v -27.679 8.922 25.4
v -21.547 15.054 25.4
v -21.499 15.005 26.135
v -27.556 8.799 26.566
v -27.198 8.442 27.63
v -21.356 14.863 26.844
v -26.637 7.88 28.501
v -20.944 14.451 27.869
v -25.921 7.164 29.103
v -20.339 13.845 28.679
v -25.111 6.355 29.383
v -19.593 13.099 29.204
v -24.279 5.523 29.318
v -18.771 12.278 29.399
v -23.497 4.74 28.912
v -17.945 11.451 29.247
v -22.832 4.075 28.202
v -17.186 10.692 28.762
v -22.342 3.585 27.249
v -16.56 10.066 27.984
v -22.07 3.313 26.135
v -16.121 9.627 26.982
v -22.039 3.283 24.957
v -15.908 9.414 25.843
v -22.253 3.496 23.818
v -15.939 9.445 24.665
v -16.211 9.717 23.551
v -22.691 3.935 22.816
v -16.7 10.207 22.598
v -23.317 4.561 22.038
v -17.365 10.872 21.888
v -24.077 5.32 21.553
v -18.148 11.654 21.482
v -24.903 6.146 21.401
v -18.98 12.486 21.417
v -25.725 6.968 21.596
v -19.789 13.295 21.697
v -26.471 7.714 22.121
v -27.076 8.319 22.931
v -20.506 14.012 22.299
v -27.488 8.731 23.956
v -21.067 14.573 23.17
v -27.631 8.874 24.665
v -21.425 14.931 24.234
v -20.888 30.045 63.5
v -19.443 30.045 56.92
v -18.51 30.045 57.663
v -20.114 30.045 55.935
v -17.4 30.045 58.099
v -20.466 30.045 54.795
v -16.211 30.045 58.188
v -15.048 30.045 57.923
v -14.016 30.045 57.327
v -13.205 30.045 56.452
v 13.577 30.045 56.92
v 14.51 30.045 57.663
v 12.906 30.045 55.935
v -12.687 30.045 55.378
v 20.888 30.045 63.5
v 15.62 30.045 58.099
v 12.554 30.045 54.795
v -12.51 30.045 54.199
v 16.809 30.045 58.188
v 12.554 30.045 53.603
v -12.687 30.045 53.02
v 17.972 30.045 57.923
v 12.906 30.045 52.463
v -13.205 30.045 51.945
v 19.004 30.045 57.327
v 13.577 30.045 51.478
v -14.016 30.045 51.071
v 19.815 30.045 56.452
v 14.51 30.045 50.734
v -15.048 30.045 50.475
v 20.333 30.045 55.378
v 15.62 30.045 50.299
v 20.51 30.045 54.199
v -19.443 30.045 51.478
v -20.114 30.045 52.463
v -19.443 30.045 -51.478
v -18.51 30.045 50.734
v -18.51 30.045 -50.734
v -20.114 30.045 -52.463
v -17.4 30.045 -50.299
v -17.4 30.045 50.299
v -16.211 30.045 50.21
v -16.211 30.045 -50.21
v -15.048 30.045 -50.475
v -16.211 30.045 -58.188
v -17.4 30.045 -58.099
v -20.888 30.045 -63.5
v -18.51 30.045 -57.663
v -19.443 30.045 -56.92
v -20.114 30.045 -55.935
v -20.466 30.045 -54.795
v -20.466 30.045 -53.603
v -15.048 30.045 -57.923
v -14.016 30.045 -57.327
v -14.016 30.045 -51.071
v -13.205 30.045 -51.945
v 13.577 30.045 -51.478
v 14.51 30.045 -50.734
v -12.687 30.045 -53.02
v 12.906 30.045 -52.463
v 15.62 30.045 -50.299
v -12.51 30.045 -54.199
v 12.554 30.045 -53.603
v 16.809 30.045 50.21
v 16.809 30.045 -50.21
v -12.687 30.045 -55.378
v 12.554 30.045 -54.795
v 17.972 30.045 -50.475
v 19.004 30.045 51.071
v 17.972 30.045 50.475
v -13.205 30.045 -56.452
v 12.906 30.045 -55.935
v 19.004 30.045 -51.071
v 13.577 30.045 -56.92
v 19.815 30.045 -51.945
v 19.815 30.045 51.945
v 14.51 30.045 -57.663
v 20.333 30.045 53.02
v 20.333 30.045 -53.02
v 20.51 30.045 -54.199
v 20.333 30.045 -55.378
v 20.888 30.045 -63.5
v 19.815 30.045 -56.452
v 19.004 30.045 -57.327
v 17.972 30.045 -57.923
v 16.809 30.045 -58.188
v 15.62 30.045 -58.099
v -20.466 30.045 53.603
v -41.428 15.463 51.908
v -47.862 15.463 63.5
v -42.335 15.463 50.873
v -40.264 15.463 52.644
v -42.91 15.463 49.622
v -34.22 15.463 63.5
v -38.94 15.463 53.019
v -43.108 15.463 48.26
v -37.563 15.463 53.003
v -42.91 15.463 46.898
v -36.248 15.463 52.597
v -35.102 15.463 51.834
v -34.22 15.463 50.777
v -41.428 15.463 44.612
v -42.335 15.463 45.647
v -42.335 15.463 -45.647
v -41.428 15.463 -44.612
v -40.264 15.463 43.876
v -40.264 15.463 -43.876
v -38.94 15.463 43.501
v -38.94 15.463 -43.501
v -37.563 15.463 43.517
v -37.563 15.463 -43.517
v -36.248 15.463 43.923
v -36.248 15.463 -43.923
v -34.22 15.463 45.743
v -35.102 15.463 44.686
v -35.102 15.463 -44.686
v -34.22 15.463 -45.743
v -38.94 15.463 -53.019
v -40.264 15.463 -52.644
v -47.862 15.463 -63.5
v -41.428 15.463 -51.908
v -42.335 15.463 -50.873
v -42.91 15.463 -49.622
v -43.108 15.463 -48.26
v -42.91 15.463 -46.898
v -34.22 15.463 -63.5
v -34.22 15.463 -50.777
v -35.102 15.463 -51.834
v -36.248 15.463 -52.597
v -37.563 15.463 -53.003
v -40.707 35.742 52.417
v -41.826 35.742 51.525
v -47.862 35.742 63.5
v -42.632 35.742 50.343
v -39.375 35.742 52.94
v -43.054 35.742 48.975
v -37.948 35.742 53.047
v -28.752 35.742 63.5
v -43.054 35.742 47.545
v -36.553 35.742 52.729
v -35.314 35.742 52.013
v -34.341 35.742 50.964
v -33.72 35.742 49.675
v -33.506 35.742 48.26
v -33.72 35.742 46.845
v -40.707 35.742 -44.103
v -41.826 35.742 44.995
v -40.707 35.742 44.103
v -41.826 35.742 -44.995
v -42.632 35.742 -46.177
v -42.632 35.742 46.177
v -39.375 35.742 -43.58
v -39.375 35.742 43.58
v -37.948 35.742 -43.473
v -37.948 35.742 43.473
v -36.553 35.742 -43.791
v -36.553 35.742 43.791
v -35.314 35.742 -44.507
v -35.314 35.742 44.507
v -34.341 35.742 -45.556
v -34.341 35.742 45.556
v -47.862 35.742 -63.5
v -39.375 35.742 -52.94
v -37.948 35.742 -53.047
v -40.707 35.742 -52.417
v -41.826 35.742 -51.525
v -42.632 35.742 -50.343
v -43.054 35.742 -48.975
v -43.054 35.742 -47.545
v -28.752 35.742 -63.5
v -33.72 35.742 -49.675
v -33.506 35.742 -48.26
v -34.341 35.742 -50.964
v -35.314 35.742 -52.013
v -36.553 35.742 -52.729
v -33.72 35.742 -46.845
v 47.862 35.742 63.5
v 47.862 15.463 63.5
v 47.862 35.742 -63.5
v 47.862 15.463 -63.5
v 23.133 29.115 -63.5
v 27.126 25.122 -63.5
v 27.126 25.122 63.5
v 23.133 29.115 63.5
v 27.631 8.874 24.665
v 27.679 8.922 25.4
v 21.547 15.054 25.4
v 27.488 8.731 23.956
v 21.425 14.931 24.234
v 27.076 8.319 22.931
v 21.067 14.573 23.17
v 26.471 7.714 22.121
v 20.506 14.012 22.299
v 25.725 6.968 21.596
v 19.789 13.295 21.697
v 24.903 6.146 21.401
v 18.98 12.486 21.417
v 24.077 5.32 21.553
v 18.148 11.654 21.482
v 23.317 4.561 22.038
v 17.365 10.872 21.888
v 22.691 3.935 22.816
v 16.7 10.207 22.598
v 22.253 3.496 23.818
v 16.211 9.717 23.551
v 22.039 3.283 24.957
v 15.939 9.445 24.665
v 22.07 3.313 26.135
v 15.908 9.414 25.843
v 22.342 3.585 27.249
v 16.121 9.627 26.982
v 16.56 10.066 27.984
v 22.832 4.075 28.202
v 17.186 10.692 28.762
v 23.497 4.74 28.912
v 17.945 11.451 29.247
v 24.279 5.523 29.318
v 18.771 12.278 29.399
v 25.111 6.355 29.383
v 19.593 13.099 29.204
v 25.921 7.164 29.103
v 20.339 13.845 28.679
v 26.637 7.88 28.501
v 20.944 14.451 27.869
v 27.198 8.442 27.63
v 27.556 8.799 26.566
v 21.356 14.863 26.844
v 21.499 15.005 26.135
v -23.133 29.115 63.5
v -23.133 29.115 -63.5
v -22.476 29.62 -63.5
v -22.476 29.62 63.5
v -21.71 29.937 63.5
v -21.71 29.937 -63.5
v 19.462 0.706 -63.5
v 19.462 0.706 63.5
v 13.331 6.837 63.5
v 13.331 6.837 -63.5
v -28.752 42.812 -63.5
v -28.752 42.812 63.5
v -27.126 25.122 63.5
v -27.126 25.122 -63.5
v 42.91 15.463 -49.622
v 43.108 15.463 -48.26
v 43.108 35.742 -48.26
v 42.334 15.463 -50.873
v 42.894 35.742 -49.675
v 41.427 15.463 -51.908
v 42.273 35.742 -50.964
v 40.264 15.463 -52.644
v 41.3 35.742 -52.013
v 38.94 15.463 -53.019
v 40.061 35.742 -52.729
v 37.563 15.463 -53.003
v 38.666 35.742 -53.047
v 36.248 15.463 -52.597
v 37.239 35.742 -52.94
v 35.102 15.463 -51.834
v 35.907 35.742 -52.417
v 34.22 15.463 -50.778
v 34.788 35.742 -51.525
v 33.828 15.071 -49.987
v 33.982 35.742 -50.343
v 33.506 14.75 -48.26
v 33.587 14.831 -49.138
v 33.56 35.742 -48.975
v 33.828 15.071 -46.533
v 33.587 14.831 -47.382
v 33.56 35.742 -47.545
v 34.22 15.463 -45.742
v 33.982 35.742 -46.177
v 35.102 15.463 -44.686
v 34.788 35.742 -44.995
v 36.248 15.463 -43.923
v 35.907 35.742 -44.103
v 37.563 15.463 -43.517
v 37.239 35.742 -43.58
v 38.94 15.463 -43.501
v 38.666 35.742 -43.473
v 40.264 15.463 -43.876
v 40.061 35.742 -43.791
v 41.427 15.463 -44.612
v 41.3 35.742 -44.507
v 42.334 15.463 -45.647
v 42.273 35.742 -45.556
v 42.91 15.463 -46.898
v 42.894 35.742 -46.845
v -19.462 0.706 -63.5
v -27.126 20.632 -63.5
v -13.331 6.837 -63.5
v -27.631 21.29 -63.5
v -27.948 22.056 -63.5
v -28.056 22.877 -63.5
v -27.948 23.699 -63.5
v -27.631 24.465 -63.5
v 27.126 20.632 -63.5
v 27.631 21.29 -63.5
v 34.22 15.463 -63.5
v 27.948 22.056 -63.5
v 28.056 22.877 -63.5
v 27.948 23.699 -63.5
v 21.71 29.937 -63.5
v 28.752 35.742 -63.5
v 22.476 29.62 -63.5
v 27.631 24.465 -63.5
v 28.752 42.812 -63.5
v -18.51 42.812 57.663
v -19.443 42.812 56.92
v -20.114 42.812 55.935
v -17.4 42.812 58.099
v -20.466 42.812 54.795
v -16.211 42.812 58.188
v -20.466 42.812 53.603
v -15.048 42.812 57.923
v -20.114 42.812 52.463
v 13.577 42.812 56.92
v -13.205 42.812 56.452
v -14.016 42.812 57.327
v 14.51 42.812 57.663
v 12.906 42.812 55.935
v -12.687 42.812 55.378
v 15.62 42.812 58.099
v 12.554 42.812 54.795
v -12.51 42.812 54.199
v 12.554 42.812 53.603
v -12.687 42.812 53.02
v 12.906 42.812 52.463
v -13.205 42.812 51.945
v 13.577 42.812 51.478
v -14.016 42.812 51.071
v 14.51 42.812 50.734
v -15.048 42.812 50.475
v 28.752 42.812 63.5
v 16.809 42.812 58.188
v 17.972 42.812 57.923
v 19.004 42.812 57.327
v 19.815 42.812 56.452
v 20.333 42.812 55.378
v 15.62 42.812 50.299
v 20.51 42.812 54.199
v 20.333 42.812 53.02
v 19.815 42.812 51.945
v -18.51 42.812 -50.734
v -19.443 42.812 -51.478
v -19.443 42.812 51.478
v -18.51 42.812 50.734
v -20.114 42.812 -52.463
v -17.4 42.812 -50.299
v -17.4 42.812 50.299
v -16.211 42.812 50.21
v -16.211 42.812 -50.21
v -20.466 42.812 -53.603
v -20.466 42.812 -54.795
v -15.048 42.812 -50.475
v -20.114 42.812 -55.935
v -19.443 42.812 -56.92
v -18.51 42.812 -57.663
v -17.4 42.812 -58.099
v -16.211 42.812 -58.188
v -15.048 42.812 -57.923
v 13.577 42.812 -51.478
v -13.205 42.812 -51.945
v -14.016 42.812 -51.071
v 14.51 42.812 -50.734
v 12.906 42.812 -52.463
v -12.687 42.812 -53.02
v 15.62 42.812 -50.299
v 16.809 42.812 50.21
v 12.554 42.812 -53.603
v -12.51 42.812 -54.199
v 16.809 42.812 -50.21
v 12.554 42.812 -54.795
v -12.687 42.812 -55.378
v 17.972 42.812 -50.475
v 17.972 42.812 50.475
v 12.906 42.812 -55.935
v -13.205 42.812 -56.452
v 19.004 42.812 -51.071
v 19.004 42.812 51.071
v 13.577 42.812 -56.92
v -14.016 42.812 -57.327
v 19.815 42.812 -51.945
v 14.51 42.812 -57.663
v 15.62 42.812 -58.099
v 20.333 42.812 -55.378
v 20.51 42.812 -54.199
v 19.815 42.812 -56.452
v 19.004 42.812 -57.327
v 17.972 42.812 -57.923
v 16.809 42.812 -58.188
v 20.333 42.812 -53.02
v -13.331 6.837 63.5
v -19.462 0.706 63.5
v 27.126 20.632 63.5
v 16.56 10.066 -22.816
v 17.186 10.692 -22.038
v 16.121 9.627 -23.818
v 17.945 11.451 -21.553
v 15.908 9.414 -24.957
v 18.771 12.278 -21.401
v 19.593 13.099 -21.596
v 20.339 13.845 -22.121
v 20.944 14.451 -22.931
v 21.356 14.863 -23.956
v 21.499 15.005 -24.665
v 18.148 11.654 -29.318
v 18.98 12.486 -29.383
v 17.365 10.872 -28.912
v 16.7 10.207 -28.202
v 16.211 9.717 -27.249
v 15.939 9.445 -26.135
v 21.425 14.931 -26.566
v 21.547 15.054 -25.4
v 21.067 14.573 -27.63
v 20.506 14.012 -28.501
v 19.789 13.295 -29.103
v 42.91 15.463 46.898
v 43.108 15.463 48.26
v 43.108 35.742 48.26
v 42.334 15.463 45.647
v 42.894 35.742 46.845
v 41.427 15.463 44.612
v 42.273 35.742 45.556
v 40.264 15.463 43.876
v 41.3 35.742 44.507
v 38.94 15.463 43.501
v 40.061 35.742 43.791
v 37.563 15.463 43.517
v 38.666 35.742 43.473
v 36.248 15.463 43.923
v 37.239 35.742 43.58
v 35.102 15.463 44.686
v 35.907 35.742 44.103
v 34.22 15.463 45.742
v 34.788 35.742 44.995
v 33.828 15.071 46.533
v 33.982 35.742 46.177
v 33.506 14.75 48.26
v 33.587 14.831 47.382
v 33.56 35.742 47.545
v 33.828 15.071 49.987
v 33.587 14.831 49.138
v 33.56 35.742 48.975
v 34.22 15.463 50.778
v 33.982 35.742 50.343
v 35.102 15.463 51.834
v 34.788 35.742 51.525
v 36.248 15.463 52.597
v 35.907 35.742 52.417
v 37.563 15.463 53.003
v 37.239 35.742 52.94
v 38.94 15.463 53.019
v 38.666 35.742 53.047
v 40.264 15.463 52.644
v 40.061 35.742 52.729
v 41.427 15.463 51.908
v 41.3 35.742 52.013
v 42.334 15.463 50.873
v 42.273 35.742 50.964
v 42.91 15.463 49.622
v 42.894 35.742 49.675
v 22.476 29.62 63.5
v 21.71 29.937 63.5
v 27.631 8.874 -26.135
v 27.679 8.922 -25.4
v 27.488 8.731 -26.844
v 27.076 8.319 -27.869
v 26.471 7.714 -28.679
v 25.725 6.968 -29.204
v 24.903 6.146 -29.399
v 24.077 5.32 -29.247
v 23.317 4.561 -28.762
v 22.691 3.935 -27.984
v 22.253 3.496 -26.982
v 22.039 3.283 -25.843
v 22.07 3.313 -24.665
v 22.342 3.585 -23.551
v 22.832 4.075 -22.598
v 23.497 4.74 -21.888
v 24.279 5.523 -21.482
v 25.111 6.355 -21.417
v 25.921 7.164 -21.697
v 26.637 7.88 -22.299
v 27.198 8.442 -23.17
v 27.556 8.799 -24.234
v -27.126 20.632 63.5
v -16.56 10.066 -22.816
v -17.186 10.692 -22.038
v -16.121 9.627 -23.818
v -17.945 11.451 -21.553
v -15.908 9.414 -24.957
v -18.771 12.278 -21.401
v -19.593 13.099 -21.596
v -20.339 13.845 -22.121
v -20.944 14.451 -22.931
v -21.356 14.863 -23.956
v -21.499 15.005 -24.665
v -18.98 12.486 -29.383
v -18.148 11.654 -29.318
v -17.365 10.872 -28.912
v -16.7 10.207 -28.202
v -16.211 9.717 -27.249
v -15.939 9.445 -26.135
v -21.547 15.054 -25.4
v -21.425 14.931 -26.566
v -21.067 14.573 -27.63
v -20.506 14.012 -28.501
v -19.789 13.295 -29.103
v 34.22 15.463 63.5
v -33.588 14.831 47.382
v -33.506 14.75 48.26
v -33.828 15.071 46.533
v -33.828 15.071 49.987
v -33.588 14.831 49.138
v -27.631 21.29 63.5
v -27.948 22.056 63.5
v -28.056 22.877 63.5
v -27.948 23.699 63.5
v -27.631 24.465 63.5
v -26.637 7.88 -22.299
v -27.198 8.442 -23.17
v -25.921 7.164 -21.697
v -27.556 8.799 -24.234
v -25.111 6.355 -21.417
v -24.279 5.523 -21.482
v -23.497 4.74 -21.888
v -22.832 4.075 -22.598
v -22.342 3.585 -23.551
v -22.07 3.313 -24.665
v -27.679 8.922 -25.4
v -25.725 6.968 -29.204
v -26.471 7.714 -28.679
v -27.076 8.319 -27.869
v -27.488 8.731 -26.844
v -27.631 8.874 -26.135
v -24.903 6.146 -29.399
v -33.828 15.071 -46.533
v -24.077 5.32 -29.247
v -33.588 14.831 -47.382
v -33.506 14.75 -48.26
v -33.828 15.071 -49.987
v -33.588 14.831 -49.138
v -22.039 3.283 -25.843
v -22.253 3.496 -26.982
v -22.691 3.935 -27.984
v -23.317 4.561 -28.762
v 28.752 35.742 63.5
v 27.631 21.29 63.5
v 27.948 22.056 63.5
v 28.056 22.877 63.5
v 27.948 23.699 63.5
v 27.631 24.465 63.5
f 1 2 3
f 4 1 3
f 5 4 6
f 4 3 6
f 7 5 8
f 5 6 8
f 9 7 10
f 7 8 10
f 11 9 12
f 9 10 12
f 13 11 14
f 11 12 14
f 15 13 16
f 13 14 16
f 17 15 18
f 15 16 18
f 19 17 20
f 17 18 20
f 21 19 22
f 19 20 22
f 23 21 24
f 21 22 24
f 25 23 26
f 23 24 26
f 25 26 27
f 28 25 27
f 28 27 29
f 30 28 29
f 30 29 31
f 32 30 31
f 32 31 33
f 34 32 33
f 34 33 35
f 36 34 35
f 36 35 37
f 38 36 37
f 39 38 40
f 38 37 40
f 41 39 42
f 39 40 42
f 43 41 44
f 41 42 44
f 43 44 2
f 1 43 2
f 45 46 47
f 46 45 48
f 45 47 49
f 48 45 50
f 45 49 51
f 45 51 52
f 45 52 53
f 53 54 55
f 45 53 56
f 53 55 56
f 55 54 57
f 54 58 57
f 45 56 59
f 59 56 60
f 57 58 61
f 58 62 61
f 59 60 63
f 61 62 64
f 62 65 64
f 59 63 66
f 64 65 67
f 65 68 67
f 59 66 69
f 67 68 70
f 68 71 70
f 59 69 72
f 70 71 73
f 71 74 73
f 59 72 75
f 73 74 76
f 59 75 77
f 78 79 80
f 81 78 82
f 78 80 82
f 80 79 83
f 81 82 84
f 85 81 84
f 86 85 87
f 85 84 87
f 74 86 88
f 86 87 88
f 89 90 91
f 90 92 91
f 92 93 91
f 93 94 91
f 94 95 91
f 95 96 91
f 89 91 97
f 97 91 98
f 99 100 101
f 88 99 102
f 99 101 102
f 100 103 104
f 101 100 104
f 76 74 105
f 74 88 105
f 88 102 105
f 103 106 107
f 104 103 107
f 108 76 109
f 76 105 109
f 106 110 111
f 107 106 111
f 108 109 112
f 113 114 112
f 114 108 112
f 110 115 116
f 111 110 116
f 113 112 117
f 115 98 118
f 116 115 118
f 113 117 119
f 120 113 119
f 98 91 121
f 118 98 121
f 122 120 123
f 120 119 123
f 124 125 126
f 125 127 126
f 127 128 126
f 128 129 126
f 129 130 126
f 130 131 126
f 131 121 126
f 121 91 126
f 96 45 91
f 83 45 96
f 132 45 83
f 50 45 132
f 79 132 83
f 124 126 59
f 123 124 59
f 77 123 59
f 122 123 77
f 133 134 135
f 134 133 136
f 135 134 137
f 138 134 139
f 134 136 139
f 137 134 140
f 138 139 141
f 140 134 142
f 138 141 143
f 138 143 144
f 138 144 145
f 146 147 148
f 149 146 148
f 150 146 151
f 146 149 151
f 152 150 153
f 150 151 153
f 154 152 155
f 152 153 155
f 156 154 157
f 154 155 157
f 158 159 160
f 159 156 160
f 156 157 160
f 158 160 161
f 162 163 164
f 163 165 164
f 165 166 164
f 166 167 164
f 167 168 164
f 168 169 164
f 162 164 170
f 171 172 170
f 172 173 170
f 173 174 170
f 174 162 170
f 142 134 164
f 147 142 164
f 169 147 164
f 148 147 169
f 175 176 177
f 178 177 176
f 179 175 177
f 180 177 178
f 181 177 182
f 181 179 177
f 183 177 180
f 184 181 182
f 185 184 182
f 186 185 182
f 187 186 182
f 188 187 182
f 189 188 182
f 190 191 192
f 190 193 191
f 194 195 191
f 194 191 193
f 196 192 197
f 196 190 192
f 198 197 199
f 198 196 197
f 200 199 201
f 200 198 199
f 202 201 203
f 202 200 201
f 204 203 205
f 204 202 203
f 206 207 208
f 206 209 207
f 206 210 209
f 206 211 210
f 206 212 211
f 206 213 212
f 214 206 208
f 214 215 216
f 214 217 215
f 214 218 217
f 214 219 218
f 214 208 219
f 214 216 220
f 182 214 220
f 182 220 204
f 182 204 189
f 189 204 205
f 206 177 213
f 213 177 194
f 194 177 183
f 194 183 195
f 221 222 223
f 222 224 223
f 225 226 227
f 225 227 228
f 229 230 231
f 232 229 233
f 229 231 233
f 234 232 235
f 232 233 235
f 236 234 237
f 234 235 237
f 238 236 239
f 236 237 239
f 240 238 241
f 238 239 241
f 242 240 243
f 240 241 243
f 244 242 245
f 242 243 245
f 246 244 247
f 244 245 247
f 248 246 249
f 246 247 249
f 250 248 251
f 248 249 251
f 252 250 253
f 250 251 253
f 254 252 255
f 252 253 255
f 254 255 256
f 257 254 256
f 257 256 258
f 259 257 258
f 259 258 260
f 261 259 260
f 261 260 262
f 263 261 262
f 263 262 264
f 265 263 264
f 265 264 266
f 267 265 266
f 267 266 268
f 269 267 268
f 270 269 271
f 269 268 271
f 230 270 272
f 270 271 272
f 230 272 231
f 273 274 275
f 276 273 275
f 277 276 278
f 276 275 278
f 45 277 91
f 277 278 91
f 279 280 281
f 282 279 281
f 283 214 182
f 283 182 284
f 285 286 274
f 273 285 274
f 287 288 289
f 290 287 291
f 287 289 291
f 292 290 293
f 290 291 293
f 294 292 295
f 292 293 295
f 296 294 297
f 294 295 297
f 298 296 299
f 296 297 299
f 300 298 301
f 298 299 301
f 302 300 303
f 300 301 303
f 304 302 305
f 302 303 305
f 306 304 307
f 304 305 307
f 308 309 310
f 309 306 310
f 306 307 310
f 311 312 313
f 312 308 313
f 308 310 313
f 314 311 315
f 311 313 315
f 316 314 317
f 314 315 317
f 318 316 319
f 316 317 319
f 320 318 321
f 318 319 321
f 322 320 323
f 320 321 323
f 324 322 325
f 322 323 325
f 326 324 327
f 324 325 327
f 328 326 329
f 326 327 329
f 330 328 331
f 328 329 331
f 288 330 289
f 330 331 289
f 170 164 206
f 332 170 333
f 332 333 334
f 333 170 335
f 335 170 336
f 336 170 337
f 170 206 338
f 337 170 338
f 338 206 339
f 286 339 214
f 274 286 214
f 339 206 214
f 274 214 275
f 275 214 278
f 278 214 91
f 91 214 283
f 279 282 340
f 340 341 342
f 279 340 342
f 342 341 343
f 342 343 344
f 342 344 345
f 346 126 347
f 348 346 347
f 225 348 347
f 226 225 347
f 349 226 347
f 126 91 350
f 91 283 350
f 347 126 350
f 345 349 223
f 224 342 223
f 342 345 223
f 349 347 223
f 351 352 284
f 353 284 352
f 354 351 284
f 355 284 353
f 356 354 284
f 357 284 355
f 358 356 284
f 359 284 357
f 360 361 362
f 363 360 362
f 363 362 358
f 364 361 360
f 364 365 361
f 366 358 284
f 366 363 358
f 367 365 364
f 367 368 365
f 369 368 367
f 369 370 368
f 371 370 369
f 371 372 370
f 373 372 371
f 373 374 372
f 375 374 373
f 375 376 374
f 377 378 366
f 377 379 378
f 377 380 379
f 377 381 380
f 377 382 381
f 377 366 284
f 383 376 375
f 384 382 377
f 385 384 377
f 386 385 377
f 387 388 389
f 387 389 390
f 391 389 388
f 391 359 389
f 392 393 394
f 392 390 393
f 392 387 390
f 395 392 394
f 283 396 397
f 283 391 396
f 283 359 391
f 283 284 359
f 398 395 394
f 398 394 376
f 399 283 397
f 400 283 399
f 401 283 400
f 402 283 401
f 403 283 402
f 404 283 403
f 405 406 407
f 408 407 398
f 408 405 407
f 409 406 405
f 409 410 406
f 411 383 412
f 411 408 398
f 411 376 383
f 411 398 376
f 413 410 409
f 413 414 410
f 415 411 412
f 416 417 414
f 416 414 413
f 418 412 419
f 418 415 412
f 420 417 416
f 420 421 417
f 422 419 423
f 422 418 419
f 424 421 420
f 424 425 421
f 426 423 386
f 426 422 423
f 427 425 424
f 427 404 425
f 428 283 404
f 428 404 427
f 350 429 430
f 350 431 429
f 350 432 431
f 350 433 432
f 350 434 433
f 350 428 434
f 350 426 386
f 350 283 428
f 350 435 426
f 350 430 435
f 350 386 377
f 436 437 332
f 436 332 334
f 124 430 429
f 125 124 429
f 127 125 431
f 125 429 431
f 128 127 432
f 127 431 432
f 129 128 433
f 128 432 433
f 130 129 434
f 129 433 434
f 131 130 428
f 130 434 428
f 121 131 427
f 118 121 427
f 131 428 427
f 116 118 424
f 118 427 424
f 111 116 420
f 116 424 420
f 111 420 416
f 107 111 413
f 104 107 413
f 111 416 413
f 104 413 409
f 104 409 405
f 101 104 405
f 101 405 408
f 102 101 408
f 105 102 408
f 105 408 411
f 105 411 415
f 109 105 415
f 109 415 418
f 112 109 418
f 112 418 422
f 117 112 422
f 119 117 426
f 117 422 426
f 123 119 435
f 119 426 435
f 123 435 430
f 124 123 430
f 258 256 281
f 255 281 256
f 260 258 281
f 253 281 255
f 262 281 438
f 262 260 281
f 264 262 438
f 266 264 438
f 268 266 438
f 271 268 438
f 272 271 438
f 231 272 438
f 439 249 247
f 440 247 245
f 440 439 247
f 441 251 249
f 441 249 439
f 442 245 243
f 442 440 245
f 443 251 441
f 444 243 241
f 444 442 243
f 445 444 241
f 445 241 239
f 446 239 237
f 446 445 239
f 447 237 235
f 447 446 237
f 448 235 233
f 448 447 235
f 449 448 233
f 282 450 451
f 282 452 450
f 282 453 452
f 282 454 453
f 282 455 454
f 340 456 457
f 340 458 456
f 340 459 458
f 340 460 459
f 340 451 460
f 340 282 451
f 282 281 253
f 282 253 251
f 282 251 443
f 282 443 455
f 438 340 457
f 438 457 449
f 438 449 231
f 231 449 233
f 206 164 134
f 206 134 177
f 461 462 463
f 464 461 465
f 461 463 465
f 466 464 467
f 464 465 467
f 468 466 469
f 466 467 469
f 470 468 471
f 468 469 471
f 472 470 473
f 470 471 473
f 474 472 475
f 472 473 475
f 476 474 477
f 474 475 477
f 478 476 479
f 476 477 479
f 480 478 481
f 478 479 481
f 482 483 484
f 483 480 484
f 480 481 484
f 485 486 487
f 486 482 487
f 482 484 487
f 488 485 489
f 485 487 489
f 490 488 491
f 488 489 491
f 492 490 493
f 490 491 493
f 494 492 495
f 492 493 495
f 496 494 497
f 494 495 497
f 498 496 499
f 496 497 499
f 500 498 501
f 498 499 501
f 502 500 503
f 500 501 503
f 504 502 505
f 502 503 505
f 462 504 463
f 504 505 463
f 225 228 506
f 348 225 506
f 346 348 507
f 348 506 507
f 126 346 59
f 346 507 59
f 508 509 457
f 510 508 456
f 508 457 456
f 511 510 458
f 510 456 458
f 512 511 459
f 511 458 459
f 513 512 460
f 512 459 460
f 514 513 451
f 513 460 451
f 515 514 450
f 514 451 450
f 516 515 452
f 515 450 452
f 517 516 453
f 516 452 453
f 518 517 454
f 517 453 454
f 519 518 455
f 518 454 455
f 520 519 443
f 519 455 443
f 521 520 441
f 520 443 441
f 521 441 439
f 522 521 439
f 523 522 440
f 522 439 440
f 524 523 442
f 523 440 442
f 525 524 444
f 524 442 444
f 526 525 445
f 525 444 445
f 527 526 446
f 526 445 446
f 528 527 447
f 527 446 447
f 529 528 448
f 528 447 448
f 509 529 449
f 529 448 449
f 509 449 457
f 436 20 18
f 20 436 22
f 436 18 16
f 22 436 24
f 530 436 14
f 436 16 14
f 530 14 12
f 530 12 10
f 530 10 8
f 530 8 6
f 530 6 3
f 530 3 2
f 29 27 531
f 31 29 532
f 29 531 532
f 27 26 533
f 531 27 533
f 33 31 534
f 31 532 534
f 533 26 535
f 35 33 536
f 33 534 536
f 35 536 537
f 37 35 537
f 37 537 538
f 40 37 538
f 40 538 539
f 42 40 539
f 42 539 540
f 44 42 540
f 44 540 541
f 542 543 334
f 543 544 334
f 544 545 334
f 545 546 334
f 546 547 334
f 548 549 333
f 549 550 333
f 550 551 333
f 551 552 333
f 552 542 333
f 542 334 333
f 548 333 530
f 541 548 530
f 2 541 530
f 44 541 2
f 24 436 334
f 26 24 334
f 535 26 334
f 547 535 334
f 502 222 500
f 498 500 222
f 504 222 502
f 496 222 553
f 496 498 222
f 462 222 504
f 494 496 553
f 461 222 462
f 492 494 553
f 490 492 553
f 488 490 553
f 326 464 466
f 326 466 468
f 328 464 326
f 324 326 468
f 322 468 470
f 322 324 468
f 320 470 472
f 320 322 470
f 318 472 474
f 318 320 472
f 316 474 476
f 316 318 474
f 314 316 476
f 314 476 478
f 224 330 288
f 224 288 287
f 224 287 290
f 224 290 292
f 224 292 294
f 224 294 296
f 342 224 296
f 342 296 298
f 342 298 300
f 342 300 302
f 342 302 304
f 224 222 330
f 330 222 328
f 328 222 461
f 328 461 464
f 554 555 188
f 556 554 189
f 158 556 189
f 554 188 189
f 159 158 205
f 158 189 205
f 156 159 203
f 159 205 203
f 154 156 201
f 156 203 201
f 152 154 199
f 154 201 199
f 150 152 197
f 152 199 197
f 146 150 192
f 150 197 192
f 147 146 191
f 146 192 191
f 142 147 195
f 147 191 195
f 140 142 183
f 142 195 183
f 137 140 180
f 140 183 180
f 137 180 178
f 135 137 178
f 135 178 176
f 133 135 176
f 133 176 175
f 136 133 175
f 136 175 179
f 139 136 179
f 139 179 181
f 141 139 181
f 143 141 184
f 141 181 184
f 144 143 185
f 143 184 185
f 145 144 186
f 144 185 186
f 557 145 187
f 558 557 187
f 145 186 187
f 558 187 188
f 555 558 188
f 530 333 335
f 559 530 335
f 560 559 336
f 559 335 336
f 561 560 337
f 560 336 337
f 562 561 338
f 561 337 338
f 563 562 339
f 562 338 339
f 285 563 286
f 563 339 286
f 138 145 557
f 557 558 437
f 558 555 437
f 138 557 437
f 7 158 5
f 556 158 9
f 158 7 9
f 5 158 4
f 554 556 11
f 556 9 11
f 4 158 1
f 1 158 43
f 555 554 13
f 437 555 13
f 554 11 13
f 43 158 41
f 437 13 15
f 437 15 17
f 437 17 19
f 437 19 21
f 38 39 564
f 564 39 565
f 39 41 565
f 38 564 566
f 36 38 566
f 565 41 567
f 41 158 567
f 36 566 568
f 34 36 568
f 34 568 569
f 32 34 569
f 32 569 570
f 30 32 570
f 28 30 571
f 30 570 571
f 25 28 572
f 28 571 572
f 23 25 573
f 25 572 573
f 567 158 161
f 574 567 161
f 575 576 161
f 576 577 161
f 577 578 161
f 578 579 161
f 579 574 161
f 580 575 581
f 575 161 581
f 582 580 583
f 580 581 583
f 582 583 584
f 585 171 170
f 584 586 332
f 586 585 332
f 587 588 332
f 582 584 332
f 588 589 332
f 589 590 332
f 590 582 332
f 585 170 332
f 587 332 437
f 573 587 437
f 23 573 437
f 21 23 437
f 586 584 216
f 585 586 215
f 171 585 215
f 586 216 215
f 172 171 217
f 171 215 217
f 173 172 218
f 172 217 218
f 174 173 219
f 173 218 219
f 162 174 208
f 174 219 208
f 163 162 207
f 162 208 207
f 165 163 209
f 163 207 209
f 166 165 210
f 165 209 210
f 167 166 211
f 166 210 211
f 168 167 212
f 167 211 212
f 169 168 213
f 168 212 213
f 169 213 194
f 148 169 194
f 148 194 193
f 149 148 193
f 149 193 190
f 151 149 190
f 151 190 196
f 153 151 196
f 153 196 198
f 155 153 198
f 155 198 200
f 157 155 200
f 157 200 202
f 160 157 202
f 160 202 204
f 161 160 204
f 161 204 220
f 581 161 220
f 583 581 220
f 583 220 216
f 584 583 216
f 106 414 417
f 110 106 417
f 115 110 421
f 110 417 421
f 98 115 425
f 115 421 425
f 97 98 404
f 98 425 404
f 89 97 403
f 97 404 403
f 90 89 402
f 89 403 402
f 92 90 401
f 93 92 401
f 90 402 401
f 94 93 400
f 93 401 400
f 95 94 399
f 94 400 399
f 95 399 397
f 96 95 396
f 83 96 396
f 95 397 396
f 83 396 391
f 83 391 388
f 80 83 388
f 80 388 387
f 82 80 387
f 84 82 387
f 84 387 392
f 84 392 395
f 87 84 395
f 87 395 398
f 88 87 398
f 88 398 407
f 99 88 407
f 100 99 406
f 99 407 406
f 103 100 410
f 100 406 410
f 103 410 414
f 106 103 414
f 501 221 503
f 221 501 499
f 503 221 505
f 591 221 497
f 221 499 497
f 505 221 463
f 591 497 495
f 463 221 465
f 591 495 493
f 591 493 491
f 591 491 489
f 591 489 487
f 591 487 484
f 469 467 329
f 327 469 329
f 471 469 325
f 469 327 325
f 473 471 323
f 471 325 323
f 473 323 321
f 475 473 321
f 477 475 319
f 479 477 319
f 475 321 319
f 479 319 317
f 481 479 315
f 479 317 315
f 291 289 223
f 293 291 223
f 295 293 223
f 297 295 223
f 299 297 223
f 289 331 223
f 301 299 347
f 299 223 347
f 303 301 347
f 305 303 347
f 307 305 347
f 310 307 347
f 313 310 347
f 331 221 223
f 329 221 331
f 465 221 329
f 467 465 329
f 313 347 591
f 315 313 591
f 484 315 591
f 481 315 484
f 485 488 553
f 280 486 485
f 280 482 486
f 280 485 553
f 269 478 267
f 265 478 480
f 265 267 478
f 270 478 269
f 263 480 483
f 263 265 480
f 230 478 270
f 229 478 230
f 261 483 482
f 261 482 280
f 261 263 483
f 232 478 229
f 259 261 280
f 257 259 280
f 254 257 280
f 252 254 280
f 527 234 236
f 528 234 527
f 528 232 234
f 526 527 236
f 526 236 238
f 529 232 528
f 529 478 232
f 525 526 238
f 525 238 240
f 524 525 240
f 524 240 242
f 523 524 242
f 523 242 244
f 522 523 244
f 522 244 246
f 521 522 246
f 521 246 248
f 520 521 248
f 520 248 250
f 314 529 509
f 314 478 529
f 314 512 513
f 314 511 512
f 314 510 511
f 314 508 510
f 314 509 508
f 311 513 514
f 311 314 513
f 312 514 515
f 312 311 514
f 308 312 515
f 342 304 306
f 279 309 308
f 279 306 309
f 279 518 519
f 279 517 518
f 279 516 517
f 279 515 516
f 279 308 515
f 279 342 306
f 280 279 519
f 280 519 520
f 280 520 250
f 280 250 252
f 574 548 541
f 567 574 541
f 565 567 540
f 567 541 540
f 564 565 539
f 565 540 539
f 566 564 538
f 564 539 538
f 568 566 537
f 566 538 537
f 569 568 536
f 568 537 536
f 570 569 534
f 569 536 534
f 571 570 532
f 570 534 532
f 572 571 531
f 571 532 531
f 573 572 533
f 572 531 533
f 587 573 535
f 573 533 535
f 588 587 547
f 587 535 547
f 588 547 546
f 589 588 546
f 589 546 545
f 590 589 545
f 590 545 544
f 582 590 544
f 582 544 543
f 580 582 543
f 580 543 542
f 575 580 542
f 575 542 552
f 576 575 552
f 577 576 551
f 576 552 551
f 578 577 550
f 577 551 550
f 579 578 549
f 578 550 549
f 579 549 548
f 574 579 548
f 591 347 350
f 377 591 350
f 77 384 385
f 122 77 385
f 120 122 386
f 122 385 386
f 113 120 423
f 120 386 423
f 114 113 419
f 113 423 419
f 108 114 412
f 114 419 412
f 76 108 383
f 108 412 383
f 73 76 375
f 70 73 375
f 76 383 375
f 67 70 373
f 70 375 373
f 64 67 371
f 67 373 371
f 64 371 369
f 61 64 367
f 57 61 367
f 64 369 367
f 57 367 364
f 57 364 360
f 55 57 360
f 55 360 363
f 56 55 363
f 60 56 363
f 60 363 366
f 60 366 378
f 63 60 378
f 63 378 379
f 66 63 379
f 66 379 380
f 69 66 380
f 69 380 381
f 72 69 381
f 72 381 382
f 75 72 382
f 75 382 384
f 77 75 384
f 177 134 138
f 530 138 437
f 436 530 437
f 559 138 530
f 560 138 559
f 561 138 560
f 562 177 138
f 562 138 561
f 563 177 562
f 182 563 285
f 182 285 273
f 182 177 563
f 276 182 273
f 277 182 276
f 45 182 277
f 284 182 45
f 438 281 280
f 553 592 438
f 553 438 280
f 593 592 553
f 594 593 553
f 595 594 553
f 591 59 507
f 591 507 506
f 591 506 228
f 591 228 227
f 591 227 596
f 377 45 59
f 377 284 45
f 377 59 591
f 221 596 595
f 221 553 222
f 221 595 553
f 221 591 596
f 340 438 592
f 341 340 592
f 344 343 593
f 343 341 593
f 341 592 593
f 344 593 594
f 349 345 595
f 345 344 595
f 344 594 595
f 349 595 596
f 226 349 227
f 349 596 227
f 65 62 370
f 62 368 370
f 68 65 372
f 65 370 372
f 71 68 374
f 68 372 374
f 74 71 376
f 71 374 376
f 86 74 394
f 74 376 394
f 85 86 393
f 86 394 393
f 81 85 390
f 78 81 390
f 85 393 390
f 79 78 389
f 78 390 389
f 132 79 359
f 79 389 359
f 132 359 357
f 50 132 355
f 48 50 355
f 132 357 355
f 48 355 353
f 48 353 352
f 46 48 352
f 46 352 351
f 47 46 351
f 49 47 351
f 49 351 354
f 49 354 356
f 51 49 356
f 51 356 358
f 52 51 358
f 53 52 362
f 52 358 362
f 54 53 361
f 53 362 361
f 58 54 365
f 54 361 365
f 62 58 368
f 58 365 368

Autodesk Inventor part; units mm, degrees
ref_plane "Work Plane3" through (0, 0, 48.26) normal (0, 0, 1) x (1, 0, 0)
ref_plane "Work Plane4" through (0, 15.4627, 63.5) normal (-1, 0, 0) x (0, 0, 1)
sketch "Sketch1" plane through (0, 0, 0) normal (0, 0, 1) x (1, 0, 0)
  line L0 (0, 17.9605) -> (17.9605, 0) construction
  line L1 (17.9605, 0) -> (0, -17.9605) construction
  line L2 (0, -17.9605) -> (-17.9605, 0) construction
  line L3 (-17.9605, 0) -> (0, 17.9605) construction
  line L4 (0, 17.9605) -> (0, -17.9605) construction
  line L5 (17.9605, 0) -> (-17.9605, 0) construction
  line L6 (0, -37.7234) -> (0, 100.617) projected
  line L7 (-27.2882, 23.4644) -> (-11.7319, 7.908) construction
  line L8 (-11.7319, 7.908) -> (-6.7821, 12.8578) construction
  line L9 (-6.7821, 12.8578) -> (-22.3385, 28.4141) construction
  line L10 (-27.2882, 23.4644) -> (-22.3385, 28.4141) construction
  line L11 (27.2882, 23.4644) -> (11.7319, 7.908) construction
  line L12 (11.7319, 7.908) -> (6.7821, 12.8578) construction
  line L13 (6.7821, 12.8578) -> (22.3385, 28.4141) construction
  line L14 (27.2882, 23.4644) -> (22.3385, 28.4141) construction
  line L15 (-13.3307, 6.837) -> (-29.3711, 22.8773)
  line L16 (-29.3711, 22.8773) -> (-22.2034, 30.045)
  line L17 (-22.2034, 30.045) -> (0, 30.045)
  line L18 (-47.8625, 35.7423) -> (-28.7516, 35.7423)
  line L19 (-28.7516, 35.7423) -> (-28.7516, 42.812)
  line L20 (-28.7516, 42.812) -> (0, 42.812)
  line L21 (-47.8625, 15.4627) -> (-47.8625, 35.7423)
  line L22 (-47.8625, 15.4627) -> (-34.2195, 15.4627)
  line L23 (-34.2195, 15.4627) -> (-19.4622, 0.7055)
  line L24 (-19.4622, 0.7055) -> (-13.3307, 6.837)
  line L25 (13.3307, 6.837) -> (29.3711, 22.8773)
  line L26 (29.3711, 22.8773) -> (22.2034, 30.045)
  line L27 (22.2034, 30.045) -> (0, 30.045)
  line L28 (47.8625, 35.7423) -> (28.7516, 35.7423)
  line L29 (28.7516, 35.7423) -> (28.7516, 42.812)
  line L30 (28.7516, 42.812) -> (0, 42.812)
  line L31 (47.8625, 15.4627) -> (47.8625, 35.7423)
  line L32 (47.8625, 15.4627) -> (34.2195, 15.4627)
  line L33 (34.2195, 15.4627) -> (19.4622, 0.7055)
  line L34 (19.4622, 0.7055) -> (13.3307, 6.837)
  line L35 (-9.1166, 42.812) -> (-9.1166, 58.2918)
  line L36 (-9.1166, 58.2918) -> (0, 58.2918)
  point P0 (0, 0)
  point P1 (0, 0)
  point P2 (0, 0)
  point P3 (0, 0)
  dimension "d2" = 25.4
  dimension "d3" = 25.4
  dimension "d6" = 22
  dimension "d14" = 7
extrude "Carriage Frame" add sketch "Sketch1" along normal mid plane 127 contours L17 L16 L15 L24 L23 L22 L21 L18 L19 L20 L6 | L6 L30 L29 L28 L31 L32 L33 L34 L25 L26 L27
fillet "Fillet1" radius 3.175 4 edges at (-29.3711, 22.8773, 0) (-22.2034, 30.045, 0) (22.2034, 30.045, 0) (29.3711, 22.8773, 0)
sketch "Sketch7" plane through (-47.8625, 35.7423, -63.5) normal (0, 1, 0) x (1, 0, 0)
  line L0 (19.1109, 0) -> (76.6141, 0) projected
  line L1 (19.1109, 0) -> (19.1109, -127) projected
  line L2 (76.6141, -127) -> (19.1109, -127) projected
  line L3 (76.6141, 0) -> (76.6141, -127) projected
  line L4 (0, 0) -> (19.1109, 0) projected
  line L5 (0, 0) -> (0, -127) projected
  line L6 (19.1109, -127) -> (0, -127) projected
  line L7 (19.1109, 0) -> (19.1109, -127) projected
  line L8 (76.6141, 0) -> (95.725, 0) projected
  line L9 (76.6141, 0) -> (76.6141, -127) projected
  line L10 (95.725, -127) -> (76.6141, -127) projected
  line L11 (95.725, 0) -> (95.725, -127) projected
  line L12 (19.1109, -63.5) -> (76.6141, -63.5) construction
  line L13 (47.8625, -63.5) -> (47.8625, -63.5) construction
  line L14 (16.8262, -19.4378) -> (9.5554, -23.6355)
  line L15 (9.5554, -23.6355) -> (2.2847, -19.4378)
  line L16 (2.2847, -19.4378) -> (2.2847, -11.0422)
  line L17 (2.2847, -11.0422) -> (9.5554, -6.8445)
  line L18 (9.5554, -6.8445) -> (16.8262, -11.0422)
  line L19 (16.8262, -11.0422) -> (16.8262, -19.4378)
  line L20 (78.8988, -19.4378) -> (86.1695, -23.6355)
  line L21 (86.1695, -23.6355) -> (93.4403, -19.4378)
  line L22 (93.4403, -19.4378) -> (93.4403, -11.0422)
  line L23 (93.4403, -11.0422) -> (86.1695, -6.8445)
  line L24 (86.1695, -6.8445) -> (78.8988, -11.0422)
  line L25 (78.8988, -11.0422) -> (78.8988, -19.4378)
  line L26 (16.8262, -107.5622) -> (9.5554, -103.3645)
  line L27 (9.5554, -103.3645) -> (2.2847, -107.5622)
  line L28 (2.2847, -107.5622) -> (2.2847, -115.9578)
  line L29 (2.2847, -115.9578) -> (9.5554, -120.1555)
  line L30 (9.5554, -120.1555) -> (16.8262, -115.9578)
  line L31 (16.8262, -115.9578) -> (16.8262, -107.5622)
  line L32 (78.8988, -115.9578) -> (78.8988, -107.5622)
  line L33 (86.1695, -120.1555) -> (78.8988, -115.9578)
  line L34 (78.8988, -107.5622) -> (86.1695, -103.3645)
  line L35 (93.4403, -115.9578) -> (86.1695, -120.1555)
  line L36 (93.4403, -107.5622) -> (93.4403, -115.9578)
  line L37 (86.1695, -103.3645) -> (93.4403, -107.5622)
  circle A0 centre (9.5554, -15.24) radius 4.8006
  circle A1 centre (86.1695, -15.24) radius 4.8006
  circle A2 centre (9.5554, -111.76) radius 4.8006
  circle A3 centre (86.1695, -111.76) radius 4.8006
  point P0 (9.5554, 0)
  dimension "d61" = 15.24
  dimension "d78" = 14.5415
  dimension "d79" = 9.6012
extrude "Carriage Screw" cut sketch "Sketch7" against normal through all contours A0 | A1 | A2 | A3
sketch "Ball Bearings" plane through (-13.3307, 6.837, -63.5) normal (0.7071, 0.7071, 0) x (-0.7071, 0.7071, 0)
  line L0 (19.5095, 127) -> (19.5095, 0) projected
  line L1 (0, 127) -> (19.5095, 127) projected
  line L2 (0, 0) -> (0, 127) projected
  line L3 (19.5095, 0) -> (0, 0) projected
  circle A0 centre (7.62, 88.9) radius 4
  line L4 (19.5095, 63.5) -> (0, 63.5) construction
  circle A1 centre (7.62, 38.1) radius 4
  point P0 (-14.2607, 63.5)
  dimension "d94" = 8
  dimension "d106" = 25.4
  dimension "d107" = 7.62
ref_plane "Carriage Mid Plane" through (0, 15.4627, -63.5) normal (-1, 0, 0) x (0, 0, 1)
extrude "Ball Bearing Hole" cut sketch "Ball Bearings" against normal up to surface (8.6713 mm away) contours A0 | A1
mirror "Mirror4" about plane through (0, 15.4627, -63.5) normal (-1, 0, 0) of "Ball Bearing Hole"
sketch "Sketch23" plane through (-28.7516, 42.812, 63.5) normal (0, 1, 0) x (1, 0, 0)
  circle A0 centre (12.2416, 117.6989) radius 4.0005
  line L0 (28.7516, 152.4) -> (28.7516, -25.4) projected
  circle A1 centre (45.2616, 117.6989) radius 4.0005
  line L1 (-38.2559, 63.5) -> (95.7591, 63.5) projected
  circle A2 centre (12.2416, 9.3011) radius 4.0005
  circle A3 centre (45.2616, 9.3011) radius 4.0005
  point P0 (28.7516, 63.5)
  dimension "d141" = 8.001
  dimension "d144" = 33.02
extrude "Extrusion20" cut sketch "Sketch23" against normal blind 16.6853
sketch "Sketch19" plane through (0, 0, 63.5) normal (0, 0, 1) x (1, 0, 0)
  line L0 (-47.8625, 15.4627) -> (-34.2195, 15.4627) projected
  line L1 (-34.2195, 15.4627) -> (-19.4622, 0.7055) projected
  line L2 (-19.4622, 0.7055) -> (-13.3307, 6.837) projected
  line L3 (-13.3307, 6.837) -> (-27.126, 20.6323) projected
  arc A0 (-27.126, 25.1224) -> (-27.126, 20.6323) centre (-24.8809, 22.8773) ccw projected
  line L4 (-27.126, 25.1224) -> (-23.1333, 29.1151) projected
  arc A1 (-20.8883, 30.045) -> (-23.1333, 29.1151) centre (-20.8883, 26.87) ccw projected
  line L5 (-20.8883, 30.045) -> (20.8883, 30.045) projected
  arc A2 (23.1333, 29.1151) -> (20.8883, 30.045) centre (20.8883, 26.87) ccw projected
  line L6 (23.1333, 29.1151) -> (27.126, 25.1224) projected
  arc A3 (27.126, 20.6323) -> (27.126, 25.1224) centre (24.8809, 22.8773) ccw projected
  line L7 (27.126, 20.6323) -> (13.3307, 6.837) projected
  line L8 (13.3307, 6.837) -> (19.4622, 0.7055) projected
  line L9 (19.4622, 0.7055) -> (34.2195, 15.4627) projected
  line L10 (34.2195, 15.4627) -> (47.8625, 15.4627) projected
  line L11 (47.8625, 15.4627) -> (47.8625, 35.7423) projected
  line L12 (47.8625, 35.7423) -> (28.7516, 35.7423) projected
  line L13 (28.7516, 35.7423) -> (28.7516, 42.812) projected
  line L14 (28.7516, 42.812) -> (-28.7516, 42.812) projected
  line L15 (-28.7516, 42.812) -> (-28.7516, 35.7423) projected
  line L16 (-28.7516, 35.7423) -> (-47.8625, 35.7423) projected
  line L17 (-47.8625, 35.7423) -> (-47.8625, 15.4627) projected
  line L18 (-28.7516, 35.7423) -> (28.7516, 35.7423)
  point P0 (0, 0)
sketch "Sketch20" plane through (0, 0, 0) normal (0, 0, 1) x (1, 0, 0)
  line L0 (-47.8625, 35.7423) -> (47.8625, 35.7423) projected
  line L1 (47.8625, 35.7423) -> (47.8625, 15.4627) projected
  line L2 (47.8625, 15.4627) -> (34.2195, 15.4627) projected
  line L3 (34.2195, 15.4627) -> (19.4622, 0.7055) projected
  line L4 (19.4622, 0.7055) -> (13.3307, 6.837) projected
  line L5 (13.3307, 6.837) -> (27.126, 20.6323) projected
  arc A0 (27.126, 20.6323) -> (27.126, 25.1224) centre (24.8809, 22.8773) ccw projected
  line L6 (27.126, 25.1224) -> (23.1333, 29.1151) projected
  arc A1 (23.1333, 29.1151) -> (20.8883, 30.045) centre (20.8883, 26.87) ccw projected
  line L7 (20.8883, 30.045) -> (-20.8883, 30.045) projected
  arc A2 (-20.8883, 30.045) -> (-23.1333, 29.1151) centre (-20.8883, 26.87) ccw projected
  line L8 (-23.1333, 29.1151) -> (-27.126, 25.1224) projected
  arc A3 (-27.126, 25.1224) -> (-27.126, 20.6323) centre (-24.8809, 22.8773) ccw projected
  line L9 (-27.126, 20.6323) -> (-13.3307, 6.837) projected
  line L10 (-13.3307, 6.837) -> (-19.4622, 0.7055) projected
  line L11 (-19.4622, 0.7055) -> (-34.2195, 15.4627) projected
  line L12 (-34.2195, 15.4627) -> (-47.8625, 15.4627) projected
  line L13 (-47.8625, 15.4627) -> (-47.8625, 35.7423) projected
  line L14 (0, -16.1708) -> (0, 97.0249) projected
  line L15 (-12.7, 35.7423) -> (-12.7, 61.1423)
  line L16 (-12.7, 61.1423) -> (0, 61.1423)
  line L17 (12.7, 35.7423) -> (12.7, 61.1423)
  line L18 (12.7, 61.1423) -> (0, 61.1423)
  point P0 (0, 0)
  dimension "d131" = 25.4
  dimension "d132" = 12.7
  dimension "d135" = 14.5542
  dimension "d136" = 9.6012
sketch "Sketch13" plane through (0, 0, 63.5) normal (0, 0, 1) x (1, 0, 0)
  line L0 (47.8625, 35.7423) -> (28.7516, 35.7423) projected
  line L1 (28.7516, 35.7423) -> (28.7516, 42.812) projected
  line L2 (28.7516, 42.812) -> (-28.7516, 42.812) projected
  line L3 (-28.7516, 42.812) -> (-28.7516, 35.7423) projected
  line L4 (-28.7516, 35.7423) -> (-47.8625, 35.7423) projected
  line L5 (-47.8625, 35.7423) -> (-47.8625, 15.4627) projected
  line L6 (-47.8625, 15.4627) -> (-34.2195, 15.4627) projected
  line L7 (-34.2195, 15.4627) -> (-19.4622, 0.7055) projected
  line L8 (-19.4622, 0.7055) -> (-13.3307, 6.837) projected
  line L9 (-13.3307, 6.837) -> (-27.126, 20.6323) projected
  arc A0 (-27.126, 25.1224) -> (-27.126, 20.6323) centre (-24.8809, 22.8773) ccw projected
  line L10 (-27.126, 25.1224) -> (-23.1333, 29.1151) projected
  arc A1 (-20.8883, 30.045) -> (-23.1333, 29.1151) centre (-20.8883, 26.87) ccw projected
  line L11 (-20.8883, 30.045) -> (20.8883, 30.045) projected
  arc A2 (23.1333, 29.1151) -> (20.8883, 30.045) centre (20.8883, 26.87) ccw projected
  line L12 (23.1333, 29.1151) -> (27.126, 25.1224) projected
  arc A3 (27.126, 20.6323) -> (27.126, 25.1224) centre (24.8809, 22.8773) ccw projected
  line L13 (27.126, 20.6323) -> (13.3307, 6.837) projected
  line L14 (13.3307, 6.837) -> (19.4622, 0.7055) projected
  line L15 (19.4622, 0.7055) -> (34.2195, 15.4627) projected
  line L16 (34.2195, 15.4627) -> (47.8625, 15.4627) projected
  line L17 (47.8625, 15.4627) -> (47.8625, 35.7423) projected
  line L18 (-3.175, 42.812) -> (3.175, 42.812)
  line L19 (3.175, 42.812) -> (3.175, 35.1375)
  line L20 (3.175, 35.1375) -> (-3.175, 35.1375)
  line L21 (-3.175, 35.1375) -> (-3.175, 42.812)
  point P0 (0, 0)
  point P1 (0, 42.812)
  point P2 (0, 42.812)
  dimension "d112" = 6.35
sketch "Sketch15" plane through (0, 0, 48.26) normal (0, 0, 1) x (1, 0, 0)
  line L0 (-3.175, 35.1375) -> (-3.175, 42.812) projected
  line L1 (-3.175, 42.812) -> (-28.7516, 42.812) projected
  line L2 (-28.7516, 42.812) -> (-28.7516, 35.7423) projected
  line L3 (-28.7516, 35.7423) -> (-47.8625, 35.7423) projected
  line L4 (-47.8625, 35.7423) -> (-47.8625, 15.4627) projected
  line L5 (-47.8625, 15.4627) -> (-34.2195, 15.4627) projected
  line L6 (-34.2195, 15.4627) -> (-19.4622, 0.7055) projected
  line L7 (-19.4622, 0.7055) -> (-13.3307, 6.837) projected
  line L8 (-13.3307, 6.837) -> (-27.126, 20.6323) projected
  arc A0 (-27.126, 25.1224) -> (-27.126, 20.6323) centre (-24.8809, 22.8773) ccw projected
  line L9 (-27.126, 25.1224) -> (-23.1333, 29.1151) projected
  arc A1 (-20.8883, 30.045) -> (-23.1333, 29.1151) centre (-20.8883, 26.87) ccw projected
  line L10 (-20.8883, 30.045) -> (20.8883, 30.045) projected
  arc A2 (23.1333, 29.1151) -> (20.8883, 30.045) centre (20.8883, 26.87) ccw projected
  line L11 (23.1333, 29.1151) -> (27.126, 25.1224) projected
  arc A3 (27.126, 20.6323) -> (27.126, 25.1224) centre (24.8809, 22.8773) ccw projected
  line L12 (27.126, 20.6323) -> (13.3307, 6.837) projected
  line L13 (13.3307, 6.837) -> (19.4622, 0.7055) projected
  line L14 (19.4622, 0.7055) -> (34.2195, 15.4627) projected
  line L15 (34.2195, 15.4627) -> (47.8625, 15.4627) projected
  line L16 (47.8625, 15.4627) -> (47.8625, 35.7423) projected
  line L17 (47.8625, 35.7423) -> (28.7516, 35.7423) projected
  line L18 (28.7516, 35.7423) -> (28.7516, 42.812) projected
  line L19 (28.7516, 42.812) -> (3.175, 42.812) projected
  line L20 (3.175, 42.812) -> (3.175, 35.1375) projected
  line L21 (3.175, 35.1375) -> (-3.175, 35.1375) projected
  line L22 (-3.175, 42.812) -> (-3.175, 80.5116) construction
  line L23 (-3.175, 80.5116) -> (3.175, 80.5116) construction
  line L24 (3.175, 42.812) -> (3.175, 80.5116) construction
  line L25 (-47.8625, 35.7423) -> (-47.8625, 49.9547)
  line L26 (-47.8625, 49.9547) -> (-17.7931, 49.9547)
  line L27 (-17.7931, 49.9547) -> (-17.7931, 73.4726)
  line L28 (-17.7931, 73.4726) -> (-3.175, 73.4726)
  line L29 (-3.175, 73.4726) -> (-3.175, 42.812)
  line L30 (-28.7516, 42.812) -> (-28.7516, 35.7423)
  point P0 (0, 0)
sketch "Sketch16" plane through (-47.8625, 49.9547, 58.42) normal (0, 1, 0) x (1, 0, 0)
  circle A0 centre (9.5554, 10.16) radius 4.8006 projected
  point P0 (47.8625, 58.42)
sketch "Sketch17" plane through (-17.7931, 49.9547, 58.42) normal (-1, 0, 0) x (0, 0, 1)
  line L0 (-20.32, 0) -> (0, 0) projected
  line L1 (0, 23.5178) -> (0, 0) projected
  line L2 (-20.32, 23.5178) -> (0, 23.5178) projected
  line L3 (-20.32, 0) -> (-20.32, 23.5178) projected
  circle A0 centre (-10.16, 11.7589) radius 4
  point P0 (-58.42, -49.9547)
  point P1 (-10.16, 23.5178)
  point P2 (0, 11.7589)
  dimension "d122" = 8
equation "\"carriage_length\" = 127"
equation "\"ball_bearing_diam\" = 22"
equation "\"ball_bearing_hole\" = 8"
equation "\"d92\" = 8"
properties part number "universal_carriage" material "ABS Plastic"
